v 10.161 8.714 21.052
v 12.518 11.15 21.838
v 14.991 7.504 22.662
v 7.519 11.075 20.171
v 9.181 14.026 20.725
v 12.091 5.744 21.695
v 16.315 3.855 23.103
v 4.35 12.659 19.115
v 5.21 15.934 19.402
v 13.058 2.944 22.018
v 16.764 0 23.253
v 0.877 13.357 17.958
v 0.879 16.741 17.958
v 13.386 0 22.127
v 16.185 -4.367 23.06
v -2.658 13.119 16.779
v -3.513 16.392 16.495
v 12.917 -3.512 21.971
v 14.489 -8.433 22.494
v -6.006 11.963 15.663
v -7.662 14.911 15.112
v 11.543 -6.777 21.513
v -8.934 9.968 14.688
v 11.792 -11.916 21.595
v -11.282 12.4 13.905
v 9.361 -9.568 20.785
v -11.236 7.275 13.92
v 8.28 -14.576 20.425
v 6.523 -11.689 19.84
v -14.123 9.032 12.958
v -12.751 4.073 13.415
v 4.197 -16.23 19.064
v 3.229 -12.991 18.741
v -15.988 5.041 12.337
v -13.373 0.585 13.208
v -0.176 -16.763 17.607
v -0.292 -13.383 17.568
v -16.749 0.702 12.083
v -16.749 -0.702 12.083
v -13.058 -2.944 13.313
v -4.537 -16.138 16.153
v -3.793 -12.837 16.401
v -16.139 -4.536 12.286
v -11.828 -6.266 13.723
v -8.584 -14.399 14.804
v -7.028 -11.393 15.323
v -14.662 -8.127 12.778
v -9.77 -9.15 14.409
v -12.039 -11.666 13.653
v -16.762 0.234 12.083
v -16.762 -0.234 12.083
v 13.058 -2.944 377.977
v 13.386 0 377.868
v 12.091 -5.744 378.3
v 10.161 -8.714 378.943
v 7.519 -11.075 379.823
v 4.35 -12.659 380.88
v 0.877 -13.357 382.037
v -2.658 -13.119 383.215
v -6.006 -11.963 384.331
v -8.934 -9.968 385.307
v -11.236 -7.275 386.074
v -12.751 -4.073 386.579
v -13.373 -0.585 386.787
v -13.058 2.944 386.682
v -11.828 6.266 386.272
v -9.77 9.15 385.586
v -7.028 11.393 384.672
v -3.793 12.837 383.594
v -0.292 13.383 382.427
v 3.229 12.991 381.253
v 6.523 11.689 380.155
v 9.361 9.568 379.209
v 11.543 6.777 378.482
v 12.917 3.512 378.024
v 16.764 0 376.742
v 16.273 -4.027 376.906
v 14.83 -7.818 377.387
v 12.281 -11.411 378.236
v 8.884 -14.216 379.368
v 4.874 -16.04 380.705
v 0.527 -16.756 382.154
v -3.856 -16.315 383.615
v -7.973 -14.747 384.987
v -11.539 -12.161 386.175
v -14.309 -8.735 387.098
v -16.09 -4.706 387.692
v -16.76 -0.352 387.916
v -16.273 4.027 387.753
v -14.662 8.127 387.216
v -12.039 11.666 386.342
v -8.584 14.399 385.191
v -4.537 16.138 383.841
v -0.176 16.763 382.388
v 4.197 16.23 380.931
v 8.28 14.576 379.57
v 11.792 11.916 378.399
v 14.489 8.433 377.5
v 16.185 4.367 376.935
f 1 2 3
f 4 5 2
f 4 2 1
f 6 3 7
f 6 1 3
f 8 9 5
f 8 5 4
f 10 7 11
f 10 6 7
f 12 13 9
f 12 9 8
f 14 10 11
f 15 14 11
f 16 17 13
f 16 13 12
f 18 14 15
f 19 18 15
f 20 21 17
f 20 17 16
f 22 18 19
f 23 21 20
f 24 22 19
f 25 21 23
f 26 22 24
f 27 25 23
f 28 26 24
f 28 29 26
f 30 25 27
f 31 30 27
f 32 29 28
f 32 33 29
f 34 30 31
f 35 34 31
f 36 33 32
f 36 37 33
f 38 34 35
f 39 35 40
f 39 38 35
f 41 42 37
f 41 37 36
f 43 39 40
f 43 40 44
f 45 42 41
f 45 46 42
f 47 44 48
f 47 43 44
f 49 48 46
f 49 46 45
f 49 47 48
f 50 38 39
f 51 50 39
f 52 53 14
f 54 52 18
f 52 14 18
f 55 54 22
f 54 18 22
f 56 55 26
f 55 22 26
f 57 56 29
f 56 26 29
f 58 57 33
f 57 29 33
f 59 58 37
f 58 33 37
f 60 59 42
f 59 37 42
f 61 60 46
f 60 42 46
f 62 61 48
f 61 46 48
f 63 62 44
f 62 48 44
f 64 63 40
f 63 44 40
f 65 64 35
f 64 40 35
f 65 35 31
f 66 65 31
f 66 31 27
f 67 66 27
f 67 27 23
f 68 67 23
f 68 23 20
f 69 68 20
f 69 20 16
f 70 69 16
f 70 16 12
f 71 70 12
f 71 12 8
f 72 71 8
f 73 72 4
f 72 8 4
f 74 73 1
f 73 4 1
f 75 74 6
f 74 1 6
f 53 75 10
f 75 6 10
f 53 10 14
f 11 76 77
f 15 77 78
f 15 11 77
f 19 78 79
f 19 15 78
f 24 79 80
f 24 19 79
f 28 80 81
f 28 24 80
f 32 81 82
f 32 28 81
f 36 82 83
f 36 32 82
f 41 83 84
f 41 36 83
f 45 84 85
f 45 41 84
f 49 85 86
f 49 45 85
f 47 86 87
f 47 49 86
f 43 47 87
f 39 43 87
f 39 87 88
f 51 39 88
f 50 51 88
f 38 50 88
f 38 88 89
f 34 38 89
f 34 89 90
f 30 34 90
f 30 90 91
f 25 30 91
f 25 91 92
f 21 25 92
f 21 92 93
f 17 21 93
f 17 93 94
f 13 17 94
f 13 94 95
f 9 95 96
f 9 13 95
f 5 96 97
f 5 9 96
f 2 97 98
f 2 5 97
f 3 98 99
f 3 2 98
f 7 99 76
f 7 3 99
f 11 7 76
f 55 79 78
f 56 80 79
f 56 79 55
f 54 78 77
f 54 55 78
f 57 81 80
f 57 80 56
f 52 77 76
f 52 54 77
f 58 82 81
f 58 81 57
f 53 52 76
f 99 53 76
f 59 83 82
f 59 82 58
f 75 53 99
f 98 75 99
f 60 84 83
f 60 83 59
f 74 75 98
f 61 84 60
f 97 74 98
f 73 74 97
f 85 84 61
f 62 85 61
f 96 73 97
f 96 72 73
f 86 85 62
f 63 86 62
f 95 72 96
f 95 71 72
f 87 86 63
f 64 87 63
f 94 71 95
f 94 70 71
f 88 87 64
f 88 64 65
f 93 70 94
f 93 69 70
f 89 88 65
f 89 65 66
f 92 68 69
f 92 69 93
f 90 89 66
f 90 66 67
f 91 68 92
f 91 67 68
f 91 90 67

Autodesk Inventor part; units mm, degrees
ref_plane "Start plane" through (0, 0, 12.0828) normal (0, 0, 1) x (1, 0, 0)
ref_plane "End plane" through (0, 0, 387.9172) normal (0, 0, 1) x (1, 0, 0)
sketch "Sketch" plane through (0, 0, 0) normal (0, 0, 1) x (1, 0, 0)
  circle A0 centre (0, 0) radius 13.3858
  circle A1 centre (0, 0) radius 16.764
  dimension "d0" = 33.528
  dimension "d1" = 3.3782
extrude "Body" add sketch "Sketch" along normal up to surface (375.8344 mm away) from surface at 12.0828
sketch "Sketch3" plane through (0, 0, 0) normal (0, 0, 1) x (1, 0, 0)
  line L0 (0, 0) -> (10, 0)
ref_plane "Work Plane3" through (0, 0, 0) normal (0, -1, 0) x (1, 0, 0)
ref_plane "Work Plane4" through (-155.3012, 0, -34.0963) normal (0.3162, 0, -0.9487) x (-0.9487, 0, -0.3162)
split "Split1" plane through (-155.3012, 0, -34.0963) removes the side toward (0.3162, 0, -0.9487)
ref_plane "Work Plane5" through (-5.3012, 0, 384.0963) normal (0.3162, 0, 0.9487) x (0.9487, 0, -0.3162)
split "Split2" plane through (-5.3012, 0, 384.0963) removes the side toward (0.3162, 0, 0.9487)
sketch "Sketch4" plane through (0, 0, 0) normal (0, -1, 0) x (1, 0, 0)
  line L0 (-2, 12.0828) -> (12, 12.0828) projected
  line L1 (-2, 387.9172) -> (12, 387.9172) projected
  dimension "d7" = 375.8344
equation "\"d0\" = G_H"
equation "\"d1\" = G_T"
equation "\"d2\" = G_L"
equation "\"G_H\" = 33.528"
equation "\"G_T\" = 3.3782"
equation "\"G_L\" = d7"
equation "\"G_OFFSET_START\" = -12.08281"
equation "\"G_OFFSET_END\" = -12.08281"
equation "\"d4\" = -G_OFFSET_START"
equation "\"d5\" = G_OFFSET_END + B_L"
equation "\"B_L\" = 400"
properties part number "ANSI - 1 x 0.133 - 14.797" material "Steel, Mild"
